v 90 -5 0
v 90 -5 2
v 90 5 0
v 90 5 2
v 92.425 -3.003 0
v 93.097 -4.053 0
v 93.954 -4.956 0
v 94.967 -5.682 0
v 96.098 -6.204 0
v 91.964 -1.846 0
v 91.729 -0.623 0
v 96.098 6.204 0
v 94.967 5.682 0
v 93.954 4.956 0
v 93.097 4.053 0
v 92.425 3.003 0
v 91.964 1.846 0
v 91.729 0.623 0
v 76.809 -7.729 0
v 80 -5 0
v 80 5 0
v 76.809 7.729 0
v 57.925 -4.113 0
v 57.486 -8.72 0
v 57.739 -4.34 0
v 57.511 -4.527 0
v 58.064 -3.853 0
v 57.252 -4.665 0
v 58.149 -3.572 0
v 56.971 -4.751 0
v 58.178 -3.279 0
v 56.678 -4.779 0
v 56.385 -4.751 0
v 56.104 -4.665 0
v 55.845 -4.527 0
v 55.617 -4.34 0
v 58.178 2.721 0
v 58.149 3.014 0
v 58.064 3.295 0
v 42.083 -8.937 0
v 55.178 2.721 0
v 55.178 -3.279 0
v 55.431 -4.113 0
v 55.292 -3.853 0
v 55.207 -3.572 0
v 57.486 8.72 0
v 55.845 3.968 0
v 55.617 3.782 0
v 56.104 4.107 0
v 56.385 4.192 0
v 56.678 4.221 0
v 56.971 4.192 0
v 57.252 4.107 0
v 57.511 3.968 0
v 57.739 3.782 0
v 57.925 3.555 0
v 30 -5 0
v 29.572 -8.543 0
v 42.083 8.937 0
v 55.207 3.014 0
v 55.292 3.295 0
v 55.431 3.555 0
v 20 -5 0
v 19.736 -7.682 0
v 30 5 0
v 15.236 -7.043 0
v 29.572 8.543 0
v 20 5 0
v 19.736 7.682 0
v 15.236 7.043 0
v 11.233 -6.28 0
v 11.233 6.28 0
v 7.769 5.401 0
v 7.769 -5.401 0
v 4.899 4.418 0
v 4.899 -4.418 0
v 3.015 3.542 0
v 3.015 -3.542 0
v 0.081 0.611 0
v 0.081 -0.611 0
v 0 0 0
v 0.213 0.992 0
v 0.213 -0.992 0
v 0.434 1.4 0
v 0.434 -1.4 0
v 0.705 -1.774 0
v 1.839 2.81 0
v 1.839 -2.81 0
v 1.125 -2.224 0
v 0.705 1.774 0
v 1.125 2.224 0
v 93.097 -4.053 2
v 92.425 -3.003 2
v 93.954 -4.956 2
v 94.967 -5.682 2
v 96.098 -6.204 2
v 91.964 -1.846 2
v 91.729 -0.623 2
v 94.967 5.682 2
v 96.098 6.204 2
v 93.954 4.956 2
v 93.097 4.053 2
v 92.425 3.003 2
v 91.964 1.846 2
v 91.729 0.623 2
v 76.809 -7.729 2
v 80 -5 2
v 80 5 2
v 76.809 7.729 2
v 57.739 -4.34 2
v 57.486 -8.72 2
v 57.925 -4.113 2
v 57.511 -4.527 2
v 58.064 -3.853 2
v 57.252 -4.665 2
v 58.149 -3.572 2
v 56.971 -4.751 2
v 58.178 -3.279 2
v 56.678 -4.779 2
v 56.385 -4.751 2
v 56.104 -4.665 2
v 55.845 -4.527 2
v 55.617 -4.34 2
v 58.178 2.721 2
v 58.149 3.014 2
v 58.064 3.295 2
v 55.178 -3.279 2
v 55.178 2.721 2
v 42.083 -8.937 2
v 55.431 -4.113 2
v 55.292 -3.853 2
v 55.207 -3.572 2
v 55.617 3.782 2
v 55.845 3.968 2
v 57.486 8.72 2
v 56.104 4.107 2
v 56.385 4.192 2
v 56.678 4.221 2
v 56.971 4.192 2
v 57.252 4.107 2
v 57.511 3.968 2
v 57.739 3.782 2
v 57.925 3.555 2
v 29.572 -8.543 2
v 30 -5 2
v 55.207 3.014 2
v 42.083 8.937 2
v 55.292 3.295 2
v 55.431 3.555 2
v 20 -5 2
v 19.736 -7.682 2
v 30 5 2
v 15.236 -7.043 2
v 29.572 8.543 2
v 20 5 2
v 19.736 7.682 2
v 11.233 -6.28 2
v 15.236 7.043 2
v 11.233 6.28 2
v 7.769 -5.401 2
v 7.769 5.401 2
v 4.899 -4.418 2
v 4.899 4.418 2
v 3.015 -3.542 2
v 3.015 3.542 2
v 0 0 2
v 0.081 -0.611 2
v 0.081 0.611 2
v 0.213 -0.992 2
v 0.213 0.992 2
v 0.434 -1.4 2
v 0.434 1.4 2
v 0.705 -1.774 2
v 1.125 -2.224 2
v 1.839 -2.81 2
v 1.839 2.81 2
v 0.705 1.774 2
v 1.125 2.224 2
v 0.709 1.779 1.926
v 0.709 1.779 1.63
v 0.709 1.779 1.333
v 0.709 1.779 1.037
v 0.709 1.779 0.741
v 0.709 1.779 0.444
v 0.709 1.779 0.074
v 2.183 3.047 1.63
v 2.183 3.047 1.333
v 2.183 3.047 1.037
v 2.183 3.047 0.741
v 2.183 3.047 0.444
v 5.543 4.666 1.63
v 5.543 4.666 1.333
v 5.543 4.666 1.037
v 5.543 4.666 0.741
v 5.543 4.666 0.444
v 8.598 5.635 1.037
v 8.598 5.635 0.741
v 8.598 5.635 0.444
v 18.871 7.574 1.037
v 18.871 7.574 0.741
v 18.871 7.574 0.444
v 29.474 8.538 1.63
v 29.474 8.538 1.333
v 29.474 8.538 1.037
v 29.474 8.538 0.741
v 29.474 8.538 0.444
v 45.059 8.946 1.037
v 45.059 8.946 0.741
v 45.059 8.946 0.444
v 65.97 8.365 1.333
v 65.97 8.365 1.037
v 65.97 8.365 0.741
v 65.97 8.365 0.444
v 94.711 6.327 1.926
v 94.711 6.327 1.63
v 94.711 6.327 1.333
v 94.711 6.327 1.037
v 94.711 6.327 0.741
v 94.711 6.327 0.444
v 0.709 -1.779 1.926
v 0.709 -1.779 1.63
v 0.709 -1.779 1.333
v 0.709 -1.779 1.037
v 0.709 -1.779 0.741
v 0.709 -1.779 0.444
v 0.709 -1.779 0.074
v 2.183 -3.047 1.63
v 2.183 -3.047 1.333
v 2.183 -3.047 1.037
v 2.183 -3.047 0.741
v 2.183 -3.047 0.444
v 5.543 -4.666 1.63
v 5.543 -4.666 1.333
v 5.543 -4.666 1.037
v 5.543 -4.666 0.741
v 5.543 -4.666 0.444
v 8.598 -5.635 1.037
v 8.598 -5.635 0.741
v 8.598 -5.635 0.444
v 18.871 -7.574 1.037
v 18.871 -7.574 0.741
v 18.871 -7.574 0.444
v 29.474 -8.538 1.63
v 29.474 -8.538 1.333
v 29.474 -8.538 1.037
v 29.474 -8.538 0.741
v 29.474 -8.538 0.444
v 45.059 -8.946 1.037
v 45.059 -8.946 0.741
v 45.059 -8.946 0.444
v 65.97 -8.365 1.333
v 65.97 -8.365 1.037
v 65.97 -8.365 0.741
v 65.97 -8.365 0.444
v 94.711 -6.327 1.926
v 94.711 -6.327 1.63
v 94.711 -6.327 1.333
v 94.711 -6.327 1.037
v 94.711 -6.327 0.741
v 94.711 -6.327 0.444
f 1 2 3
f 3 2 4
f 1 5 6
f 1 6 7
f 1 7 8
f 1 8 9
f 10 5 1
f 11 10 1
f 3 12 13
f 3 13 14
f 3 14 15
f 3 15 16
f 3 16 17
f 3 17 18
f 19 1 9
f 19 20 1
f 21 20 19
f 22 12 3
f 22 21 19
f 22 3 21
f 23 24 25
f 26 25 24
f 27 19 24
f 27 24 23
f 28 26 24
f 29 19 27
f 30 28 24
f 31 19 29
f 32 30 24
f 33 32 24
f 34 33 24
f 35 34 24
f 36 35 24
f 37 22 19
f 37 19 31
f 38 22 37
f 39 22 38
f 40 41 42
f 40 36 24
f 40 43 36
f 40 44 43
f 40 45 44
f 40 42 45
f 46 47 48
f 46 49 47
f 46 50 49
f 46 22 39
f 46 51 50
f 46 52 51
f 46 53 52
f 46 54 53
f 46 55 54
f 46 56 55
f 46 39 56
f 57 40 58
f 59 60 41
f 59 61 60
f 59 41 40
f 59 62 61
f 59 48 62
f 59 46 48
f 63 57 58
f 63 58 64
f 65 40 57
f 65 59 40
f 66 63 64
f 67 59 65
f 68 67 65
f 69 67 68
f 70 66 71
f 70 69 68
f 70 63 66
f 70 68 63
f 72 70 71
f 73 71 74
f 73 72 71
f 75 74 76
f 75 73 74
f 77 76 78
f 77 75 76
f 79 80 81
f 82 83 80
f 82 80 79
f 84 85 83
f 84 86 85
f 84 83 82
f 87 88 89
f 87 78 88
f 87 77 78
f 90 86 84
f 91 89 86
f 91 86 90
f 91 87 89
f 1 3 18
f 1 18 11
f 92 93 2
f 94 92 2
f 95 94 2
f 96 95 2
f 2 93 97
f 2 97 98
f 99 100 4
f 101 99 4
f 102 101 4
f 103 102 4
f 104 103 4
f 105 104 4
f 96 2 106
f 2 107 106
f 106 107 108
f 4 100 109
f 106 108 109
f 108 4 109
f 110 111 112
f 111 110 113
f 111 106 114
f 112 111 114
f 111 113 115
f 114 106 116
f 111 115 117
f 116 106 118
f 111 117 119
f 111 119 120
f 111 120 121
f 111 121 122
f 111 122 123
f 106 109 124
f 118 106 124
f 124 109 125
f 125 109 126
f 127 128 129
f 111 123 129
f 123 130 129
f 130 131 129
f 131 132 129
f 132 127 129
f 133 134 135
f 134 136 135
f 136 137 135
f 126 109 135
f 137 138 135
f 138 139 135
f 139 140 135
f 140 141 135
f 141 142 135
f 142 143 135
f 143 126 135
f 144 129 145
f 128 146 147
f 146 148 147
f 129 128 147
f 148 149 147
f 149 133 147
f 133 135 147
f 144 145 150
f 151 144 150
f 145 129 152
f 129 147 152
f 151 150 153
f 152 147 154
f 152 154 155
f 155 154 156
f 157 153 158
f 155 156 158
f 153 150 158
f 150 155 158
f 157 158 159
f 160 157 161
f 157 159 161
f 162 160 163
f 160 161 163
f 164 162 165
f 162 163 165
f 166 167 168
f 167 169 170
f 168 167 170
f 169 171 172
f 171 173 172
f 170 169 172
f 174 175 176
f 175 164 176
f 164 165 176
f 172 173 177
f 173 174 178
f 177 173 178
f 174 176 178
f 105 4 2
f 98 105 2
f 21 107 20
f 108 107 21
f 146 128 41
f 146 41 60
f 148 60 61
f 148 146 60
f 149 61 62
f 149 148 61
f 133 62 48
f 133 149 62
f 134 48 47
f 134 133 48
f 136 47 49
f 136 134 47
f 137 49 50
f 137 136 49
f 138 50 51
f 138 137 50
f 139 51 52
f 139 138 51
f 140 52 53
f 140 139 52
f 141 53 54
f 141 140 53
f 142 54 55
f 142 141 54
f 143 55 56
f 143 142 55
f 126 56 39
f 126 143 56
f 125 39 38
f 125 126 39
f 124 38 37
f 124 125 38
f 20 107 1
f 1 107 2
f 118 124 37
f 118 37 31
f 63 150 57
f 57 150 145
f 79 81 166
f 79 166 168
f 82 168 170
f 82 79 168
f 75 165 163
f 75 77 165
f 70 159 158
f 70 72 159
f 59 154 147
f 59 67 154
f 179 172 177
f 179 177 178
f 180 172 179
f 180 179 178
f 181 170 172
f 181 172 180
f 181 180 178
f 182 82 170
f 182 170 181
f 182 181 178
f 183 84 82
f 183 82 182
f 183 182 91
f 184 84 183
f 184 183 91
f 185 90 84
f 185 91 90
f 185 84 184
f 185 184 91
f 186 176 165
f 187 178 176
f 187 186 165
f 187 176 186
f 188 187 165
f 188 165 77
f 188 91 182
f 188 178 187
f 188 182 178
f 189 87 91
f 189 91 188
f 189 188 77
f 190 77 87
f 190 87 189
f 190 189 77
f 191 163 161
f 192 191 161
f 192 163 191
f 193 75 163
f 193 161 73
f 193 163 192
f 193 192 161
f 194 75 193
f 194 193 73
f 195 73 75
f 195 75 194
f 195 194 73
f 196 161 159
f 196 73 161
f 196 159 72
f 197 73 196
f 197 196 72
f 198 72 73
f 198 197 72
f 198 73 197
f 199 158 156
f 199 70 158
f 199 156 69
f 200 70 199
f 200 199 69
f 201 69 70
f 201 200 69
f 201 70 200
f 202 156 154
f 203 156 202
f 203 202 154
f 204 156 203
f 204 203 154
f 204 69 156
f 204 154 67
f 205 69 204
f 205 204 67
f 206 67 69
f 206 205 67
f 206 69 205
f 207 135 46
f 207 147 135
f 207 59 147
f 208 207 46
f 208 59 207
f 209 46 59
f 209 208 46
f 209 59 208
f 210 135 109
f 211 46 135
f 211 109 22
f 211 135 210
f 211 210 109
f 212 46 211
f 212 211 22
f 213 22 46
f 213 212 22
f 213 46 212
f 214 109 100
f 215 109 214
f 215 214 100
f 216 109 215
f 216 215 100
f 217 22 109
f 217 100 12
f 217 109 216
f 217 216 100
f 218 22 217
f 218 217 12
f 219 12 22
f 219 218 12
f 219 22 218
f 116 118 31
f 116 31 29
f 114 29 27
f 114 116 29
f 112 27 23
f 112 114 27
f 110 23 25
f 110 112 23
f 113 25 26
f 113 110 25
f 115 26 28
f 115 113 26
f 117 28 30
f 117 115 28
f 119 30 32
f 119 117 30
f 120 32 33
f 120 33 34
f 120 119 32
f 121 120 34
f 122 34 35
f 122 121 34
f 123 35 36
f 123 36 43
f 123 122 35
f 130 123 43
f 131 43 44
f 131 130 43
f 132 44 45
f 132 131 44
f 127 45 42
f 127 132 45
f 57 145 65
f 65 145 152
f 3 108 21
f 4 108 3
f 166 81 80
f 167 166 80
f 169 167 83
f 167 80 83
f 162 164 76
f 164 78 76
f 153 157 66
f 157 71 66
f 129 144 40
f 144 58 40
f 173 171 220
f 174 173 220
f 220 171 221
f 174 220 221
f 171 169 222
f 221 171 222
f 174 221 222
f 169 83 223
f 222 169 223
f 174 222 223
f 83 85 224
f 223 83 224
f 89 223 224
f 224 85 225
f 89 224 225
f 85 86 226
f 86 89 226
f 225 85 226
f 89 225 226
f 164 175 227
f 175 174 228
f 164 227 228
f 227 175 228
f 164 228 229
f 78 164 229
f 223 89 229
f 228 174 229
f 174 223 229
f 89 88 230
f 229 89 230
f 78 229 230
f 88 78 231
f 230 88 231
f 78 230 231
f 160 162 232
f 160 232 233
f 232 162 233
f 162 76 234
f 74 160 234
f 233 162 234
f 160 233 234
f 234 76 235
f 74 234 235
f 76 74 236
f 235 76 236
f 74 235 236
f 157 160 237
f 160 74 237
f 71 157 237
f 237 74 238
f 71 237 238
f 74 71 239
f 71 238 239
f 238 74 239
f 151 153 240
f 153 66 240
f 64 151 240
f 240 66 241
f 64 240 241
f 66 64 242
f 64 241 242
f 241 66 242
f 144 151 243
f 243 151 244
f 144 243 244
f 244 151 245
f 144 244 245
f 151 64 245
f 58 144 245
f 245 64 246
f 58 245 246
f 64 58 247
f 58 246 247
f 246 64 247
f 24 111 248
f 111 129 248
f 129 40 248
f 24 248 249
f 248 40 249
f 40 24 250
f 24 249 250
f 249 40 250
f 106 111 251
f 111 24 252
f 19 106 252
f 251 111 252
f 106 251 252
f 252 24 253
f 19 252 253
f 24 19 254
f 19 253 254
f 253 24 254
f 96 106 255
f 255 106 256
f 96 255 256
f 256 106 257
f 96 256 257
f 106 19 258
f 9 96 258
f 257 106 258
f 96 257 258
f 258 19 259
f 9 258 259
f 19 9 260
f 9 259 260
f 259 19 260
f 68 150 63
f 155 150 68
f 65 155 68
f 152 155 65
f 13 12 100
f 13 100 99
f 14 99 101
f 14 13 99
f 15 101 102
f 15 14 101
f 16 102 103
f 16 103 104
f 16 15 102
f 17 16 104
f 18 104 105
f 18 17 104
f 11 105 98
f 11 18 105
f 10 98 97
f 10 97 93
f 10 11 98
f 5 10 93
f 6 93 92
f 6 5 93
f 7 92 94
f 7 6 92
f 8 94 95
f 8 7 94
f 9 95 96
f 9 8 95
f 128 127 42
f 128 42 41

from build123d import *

# Parameters (mm, degrees)
BOSS_EXTRUDE1_DEPTH = 2
SKETCH2_W           = 10
SKETCH2_H           = 10
CUT_EXTRUDE1_DEPTH  = 2
CUT_EXTRUDE2_DEPTH  = 2
SPLIT2_DEPTH        = 2


# Read off the part's stored shape, not the designer's step: Split2
with BuildPart() as part:
    # Sketch1 → Boss-Extrude1 (new body)
    with BuildSketch(Plane.XY):
        with BuildLine():
            add(Edge.make_bspline(
                [(0, 0), (0.017737679, 0.21563179), (0.054124727, 0.657978531), (0.343214492, 1.298862569), (0.793518335, 1.915453085), (1.418593739, 2.510411621), (2.210440726, 3.08584076), (3.169840337, 3.64229027), (4.294762462, 4.179129104), (5.583413569, 4.69513941), (7.033172592, 5.188783743), (8.640964446, 5.658406049), (11.080866503, 6.272892351), (14.502446863, 6.955454069), (19.033265173, 7.627780104), (24.084738243, 8.169485105), (29.61030038, 8.573350569), (36.653446176, 8.884204814), (45.268552866, 8.994485881), (55.449246929, 8.823980559), (67.247179838, 8.346573268), (80.384127491, 7.524875895), (94.475089666, 6.381384792), (108.784193237, 5.015612692), (123.127907022, 3.461297117), (136.57914049, 1.828195781), (145.420848795, 0.64480177), (149.505193273, 0.070051229), (149.970810304, 0.00413247), (150, 0)],
                knots=[0, 0, 0, 0, 0.004217542, 0.008651859, 0.013562306, 0.019137014, 0.025499556, 0.032726168, 0.040861643, 0.049929832, 0.059940125, 0.070891981, 0.082777029, 0.109285667, 0.139301078, 0.172602407, 0.208924358, 0.247964735, 0.310881146, 0.377906083, 0.447678538, 0.542484027, 0.636086648, 0.724985379, 0.824439816, 0.919092539, 0.990775422, 0.999421708, 1, 1, 1, 1], degree=3))
            add(Edge.make_bspline(
                [(0, 0), (0.017737679, -0.21563179), (0.054124727, -0.657978531), (0.343214492, -1.298862569), (0.793518335, -1.915453085), (1.418593739, -2.510411621), (2.210440726, -3.08584076), (3.169840337, -3.64229027), (4.294762462, -4.179129104), (5.583413569, -4.69513941), (7.033172592, -5.188783743), (8.640964446, -5.658406049), (11.080866503, -6.272892351), (14.502446863, -6.955454069), (19.033265173, -7.627780104), (24.084738243, -8.169485105), (29.61030038, -8.573350569), (36.653446176, -8.884204814), (45.268552866, -8.994485881), (55.449246929, -8.823980559), (67.247179838, -8.346573268), (80.384127491, -7.524875895), (94.475089666, -6.381384792), (108.784193237, -5.015612692), (123.127907022, -3.461297117), (136.57914049, -1.828195781), (145.420848795, -0.64480177), (149.505193273, -0.070051229), (149.970810304, -0.00413247), (150, 0)],
                knots=[0, 0, 0, 0, 0.004217542, 0.008651859, 0.013562306, 0.019137014, 0.025499556, 0.032726168, 0.040861643, 0.049929832, 0.059940125, 0.070891981, 0.082777029, 0.109285667, 0.139301078, 0.172602407, 0.208924358, 0.247964735, 0.310881146, 0.377906083, 0.447678538, 0.542484027, 0.636086648, 0.724985379, 0.824439816, 0.919092539, 0.990775422, 0.999421708, 1, 1, 1, 1], degree=3))
        make_face()
    extrude(amount=BOSS_EXTRUDE1_DEPTH)

    # Sketch2 → Cut-Extrude1 (cut)
    with BuildSketch(Plane.XY.offset(2)):
        with Locations((25, 0)):
            Rectangle(SKETCH2_W, SKETCH2_H)
        with Locations((85, 0)):
            Rectangle(SKETCH2_W, SKETCH2_H)
    extrude(amount=-CUT_EXTRUDE1_DEPTH, mode=Mode.SUBTRACT)

    # Sketch3 → Cut-Extrude2 (cut)
    with BuildSketch(Plane.XY.offset(2)):
        with BuildLine():
            Line((55.177854161, -3.279241302), (55.177854161, 2.721162631))
            ThreePointArc((55.177854161, 2.721162631), (56.677955144, 4.221263615), (58.178056128, 2.721162631))
            Line((58.178056128, 2.721162631), (58.178056128, -3.279241302))
            ThreePointArc((58.178056128, -3.279241302), (56.677955144, -4.779342285), (55.177854161, -3.279241302))
        make_face()
    extrude(amount=-CUT_EXTRUDE2_DEPTH, mode=Mode.SUBTRACT)

    # Split2 outline → Split2 (cut)
    with BuildSketch(Plane.XY):
        with BuildLine():
            add(Edge.make_bspline(
                [(150, 0), (149.970810304, 0.00413247), (149.505193273, 0.070051229), (145.420848795, 0.64480177), (136.57914049, 1.828195781), (123.127907022, 3.461297117), (109.245806797, 4.965591257), (100.149772472, 5.839460679), (96.098442191, 6.203662705)],
                knots=[0, 0, 0, 0, 0.000578292, 0.009224578, 0.080907461, 0.175560184, 0.275014621, 0.354805575, 0.354805575, 0.354805575, 0.354805575], degree=3))
            ThreePointArc((96.098442191, 6.203662705), (91.699107152, 0), (96.098442191, -6.203662705))
            add(Edge.make_bspline(
                [(96.098442191, -6.203662705), (100.149772472, -5.839460679), (109.245806797, -4.965591257), (123.127907022, -3.461297117), (136.57914049, -1.828195781), (145.420848795, -0.64480177), (149.505193273, -0.070051229), (149.970810304, -0.00413247), (150, 0)],
                knots=[0.645194425, 0.645194425, 0.645194425, 0.645194425, 0.724985379, 0.824439816, 0.919092539, 0.990775422, 0.999421708, 1, 1, 1, 1], degree=3))
        make_face()
    extrude(amount=SPLIT2_DEPTH, mode=Mode.SUBTRACT)


solid = part.part
